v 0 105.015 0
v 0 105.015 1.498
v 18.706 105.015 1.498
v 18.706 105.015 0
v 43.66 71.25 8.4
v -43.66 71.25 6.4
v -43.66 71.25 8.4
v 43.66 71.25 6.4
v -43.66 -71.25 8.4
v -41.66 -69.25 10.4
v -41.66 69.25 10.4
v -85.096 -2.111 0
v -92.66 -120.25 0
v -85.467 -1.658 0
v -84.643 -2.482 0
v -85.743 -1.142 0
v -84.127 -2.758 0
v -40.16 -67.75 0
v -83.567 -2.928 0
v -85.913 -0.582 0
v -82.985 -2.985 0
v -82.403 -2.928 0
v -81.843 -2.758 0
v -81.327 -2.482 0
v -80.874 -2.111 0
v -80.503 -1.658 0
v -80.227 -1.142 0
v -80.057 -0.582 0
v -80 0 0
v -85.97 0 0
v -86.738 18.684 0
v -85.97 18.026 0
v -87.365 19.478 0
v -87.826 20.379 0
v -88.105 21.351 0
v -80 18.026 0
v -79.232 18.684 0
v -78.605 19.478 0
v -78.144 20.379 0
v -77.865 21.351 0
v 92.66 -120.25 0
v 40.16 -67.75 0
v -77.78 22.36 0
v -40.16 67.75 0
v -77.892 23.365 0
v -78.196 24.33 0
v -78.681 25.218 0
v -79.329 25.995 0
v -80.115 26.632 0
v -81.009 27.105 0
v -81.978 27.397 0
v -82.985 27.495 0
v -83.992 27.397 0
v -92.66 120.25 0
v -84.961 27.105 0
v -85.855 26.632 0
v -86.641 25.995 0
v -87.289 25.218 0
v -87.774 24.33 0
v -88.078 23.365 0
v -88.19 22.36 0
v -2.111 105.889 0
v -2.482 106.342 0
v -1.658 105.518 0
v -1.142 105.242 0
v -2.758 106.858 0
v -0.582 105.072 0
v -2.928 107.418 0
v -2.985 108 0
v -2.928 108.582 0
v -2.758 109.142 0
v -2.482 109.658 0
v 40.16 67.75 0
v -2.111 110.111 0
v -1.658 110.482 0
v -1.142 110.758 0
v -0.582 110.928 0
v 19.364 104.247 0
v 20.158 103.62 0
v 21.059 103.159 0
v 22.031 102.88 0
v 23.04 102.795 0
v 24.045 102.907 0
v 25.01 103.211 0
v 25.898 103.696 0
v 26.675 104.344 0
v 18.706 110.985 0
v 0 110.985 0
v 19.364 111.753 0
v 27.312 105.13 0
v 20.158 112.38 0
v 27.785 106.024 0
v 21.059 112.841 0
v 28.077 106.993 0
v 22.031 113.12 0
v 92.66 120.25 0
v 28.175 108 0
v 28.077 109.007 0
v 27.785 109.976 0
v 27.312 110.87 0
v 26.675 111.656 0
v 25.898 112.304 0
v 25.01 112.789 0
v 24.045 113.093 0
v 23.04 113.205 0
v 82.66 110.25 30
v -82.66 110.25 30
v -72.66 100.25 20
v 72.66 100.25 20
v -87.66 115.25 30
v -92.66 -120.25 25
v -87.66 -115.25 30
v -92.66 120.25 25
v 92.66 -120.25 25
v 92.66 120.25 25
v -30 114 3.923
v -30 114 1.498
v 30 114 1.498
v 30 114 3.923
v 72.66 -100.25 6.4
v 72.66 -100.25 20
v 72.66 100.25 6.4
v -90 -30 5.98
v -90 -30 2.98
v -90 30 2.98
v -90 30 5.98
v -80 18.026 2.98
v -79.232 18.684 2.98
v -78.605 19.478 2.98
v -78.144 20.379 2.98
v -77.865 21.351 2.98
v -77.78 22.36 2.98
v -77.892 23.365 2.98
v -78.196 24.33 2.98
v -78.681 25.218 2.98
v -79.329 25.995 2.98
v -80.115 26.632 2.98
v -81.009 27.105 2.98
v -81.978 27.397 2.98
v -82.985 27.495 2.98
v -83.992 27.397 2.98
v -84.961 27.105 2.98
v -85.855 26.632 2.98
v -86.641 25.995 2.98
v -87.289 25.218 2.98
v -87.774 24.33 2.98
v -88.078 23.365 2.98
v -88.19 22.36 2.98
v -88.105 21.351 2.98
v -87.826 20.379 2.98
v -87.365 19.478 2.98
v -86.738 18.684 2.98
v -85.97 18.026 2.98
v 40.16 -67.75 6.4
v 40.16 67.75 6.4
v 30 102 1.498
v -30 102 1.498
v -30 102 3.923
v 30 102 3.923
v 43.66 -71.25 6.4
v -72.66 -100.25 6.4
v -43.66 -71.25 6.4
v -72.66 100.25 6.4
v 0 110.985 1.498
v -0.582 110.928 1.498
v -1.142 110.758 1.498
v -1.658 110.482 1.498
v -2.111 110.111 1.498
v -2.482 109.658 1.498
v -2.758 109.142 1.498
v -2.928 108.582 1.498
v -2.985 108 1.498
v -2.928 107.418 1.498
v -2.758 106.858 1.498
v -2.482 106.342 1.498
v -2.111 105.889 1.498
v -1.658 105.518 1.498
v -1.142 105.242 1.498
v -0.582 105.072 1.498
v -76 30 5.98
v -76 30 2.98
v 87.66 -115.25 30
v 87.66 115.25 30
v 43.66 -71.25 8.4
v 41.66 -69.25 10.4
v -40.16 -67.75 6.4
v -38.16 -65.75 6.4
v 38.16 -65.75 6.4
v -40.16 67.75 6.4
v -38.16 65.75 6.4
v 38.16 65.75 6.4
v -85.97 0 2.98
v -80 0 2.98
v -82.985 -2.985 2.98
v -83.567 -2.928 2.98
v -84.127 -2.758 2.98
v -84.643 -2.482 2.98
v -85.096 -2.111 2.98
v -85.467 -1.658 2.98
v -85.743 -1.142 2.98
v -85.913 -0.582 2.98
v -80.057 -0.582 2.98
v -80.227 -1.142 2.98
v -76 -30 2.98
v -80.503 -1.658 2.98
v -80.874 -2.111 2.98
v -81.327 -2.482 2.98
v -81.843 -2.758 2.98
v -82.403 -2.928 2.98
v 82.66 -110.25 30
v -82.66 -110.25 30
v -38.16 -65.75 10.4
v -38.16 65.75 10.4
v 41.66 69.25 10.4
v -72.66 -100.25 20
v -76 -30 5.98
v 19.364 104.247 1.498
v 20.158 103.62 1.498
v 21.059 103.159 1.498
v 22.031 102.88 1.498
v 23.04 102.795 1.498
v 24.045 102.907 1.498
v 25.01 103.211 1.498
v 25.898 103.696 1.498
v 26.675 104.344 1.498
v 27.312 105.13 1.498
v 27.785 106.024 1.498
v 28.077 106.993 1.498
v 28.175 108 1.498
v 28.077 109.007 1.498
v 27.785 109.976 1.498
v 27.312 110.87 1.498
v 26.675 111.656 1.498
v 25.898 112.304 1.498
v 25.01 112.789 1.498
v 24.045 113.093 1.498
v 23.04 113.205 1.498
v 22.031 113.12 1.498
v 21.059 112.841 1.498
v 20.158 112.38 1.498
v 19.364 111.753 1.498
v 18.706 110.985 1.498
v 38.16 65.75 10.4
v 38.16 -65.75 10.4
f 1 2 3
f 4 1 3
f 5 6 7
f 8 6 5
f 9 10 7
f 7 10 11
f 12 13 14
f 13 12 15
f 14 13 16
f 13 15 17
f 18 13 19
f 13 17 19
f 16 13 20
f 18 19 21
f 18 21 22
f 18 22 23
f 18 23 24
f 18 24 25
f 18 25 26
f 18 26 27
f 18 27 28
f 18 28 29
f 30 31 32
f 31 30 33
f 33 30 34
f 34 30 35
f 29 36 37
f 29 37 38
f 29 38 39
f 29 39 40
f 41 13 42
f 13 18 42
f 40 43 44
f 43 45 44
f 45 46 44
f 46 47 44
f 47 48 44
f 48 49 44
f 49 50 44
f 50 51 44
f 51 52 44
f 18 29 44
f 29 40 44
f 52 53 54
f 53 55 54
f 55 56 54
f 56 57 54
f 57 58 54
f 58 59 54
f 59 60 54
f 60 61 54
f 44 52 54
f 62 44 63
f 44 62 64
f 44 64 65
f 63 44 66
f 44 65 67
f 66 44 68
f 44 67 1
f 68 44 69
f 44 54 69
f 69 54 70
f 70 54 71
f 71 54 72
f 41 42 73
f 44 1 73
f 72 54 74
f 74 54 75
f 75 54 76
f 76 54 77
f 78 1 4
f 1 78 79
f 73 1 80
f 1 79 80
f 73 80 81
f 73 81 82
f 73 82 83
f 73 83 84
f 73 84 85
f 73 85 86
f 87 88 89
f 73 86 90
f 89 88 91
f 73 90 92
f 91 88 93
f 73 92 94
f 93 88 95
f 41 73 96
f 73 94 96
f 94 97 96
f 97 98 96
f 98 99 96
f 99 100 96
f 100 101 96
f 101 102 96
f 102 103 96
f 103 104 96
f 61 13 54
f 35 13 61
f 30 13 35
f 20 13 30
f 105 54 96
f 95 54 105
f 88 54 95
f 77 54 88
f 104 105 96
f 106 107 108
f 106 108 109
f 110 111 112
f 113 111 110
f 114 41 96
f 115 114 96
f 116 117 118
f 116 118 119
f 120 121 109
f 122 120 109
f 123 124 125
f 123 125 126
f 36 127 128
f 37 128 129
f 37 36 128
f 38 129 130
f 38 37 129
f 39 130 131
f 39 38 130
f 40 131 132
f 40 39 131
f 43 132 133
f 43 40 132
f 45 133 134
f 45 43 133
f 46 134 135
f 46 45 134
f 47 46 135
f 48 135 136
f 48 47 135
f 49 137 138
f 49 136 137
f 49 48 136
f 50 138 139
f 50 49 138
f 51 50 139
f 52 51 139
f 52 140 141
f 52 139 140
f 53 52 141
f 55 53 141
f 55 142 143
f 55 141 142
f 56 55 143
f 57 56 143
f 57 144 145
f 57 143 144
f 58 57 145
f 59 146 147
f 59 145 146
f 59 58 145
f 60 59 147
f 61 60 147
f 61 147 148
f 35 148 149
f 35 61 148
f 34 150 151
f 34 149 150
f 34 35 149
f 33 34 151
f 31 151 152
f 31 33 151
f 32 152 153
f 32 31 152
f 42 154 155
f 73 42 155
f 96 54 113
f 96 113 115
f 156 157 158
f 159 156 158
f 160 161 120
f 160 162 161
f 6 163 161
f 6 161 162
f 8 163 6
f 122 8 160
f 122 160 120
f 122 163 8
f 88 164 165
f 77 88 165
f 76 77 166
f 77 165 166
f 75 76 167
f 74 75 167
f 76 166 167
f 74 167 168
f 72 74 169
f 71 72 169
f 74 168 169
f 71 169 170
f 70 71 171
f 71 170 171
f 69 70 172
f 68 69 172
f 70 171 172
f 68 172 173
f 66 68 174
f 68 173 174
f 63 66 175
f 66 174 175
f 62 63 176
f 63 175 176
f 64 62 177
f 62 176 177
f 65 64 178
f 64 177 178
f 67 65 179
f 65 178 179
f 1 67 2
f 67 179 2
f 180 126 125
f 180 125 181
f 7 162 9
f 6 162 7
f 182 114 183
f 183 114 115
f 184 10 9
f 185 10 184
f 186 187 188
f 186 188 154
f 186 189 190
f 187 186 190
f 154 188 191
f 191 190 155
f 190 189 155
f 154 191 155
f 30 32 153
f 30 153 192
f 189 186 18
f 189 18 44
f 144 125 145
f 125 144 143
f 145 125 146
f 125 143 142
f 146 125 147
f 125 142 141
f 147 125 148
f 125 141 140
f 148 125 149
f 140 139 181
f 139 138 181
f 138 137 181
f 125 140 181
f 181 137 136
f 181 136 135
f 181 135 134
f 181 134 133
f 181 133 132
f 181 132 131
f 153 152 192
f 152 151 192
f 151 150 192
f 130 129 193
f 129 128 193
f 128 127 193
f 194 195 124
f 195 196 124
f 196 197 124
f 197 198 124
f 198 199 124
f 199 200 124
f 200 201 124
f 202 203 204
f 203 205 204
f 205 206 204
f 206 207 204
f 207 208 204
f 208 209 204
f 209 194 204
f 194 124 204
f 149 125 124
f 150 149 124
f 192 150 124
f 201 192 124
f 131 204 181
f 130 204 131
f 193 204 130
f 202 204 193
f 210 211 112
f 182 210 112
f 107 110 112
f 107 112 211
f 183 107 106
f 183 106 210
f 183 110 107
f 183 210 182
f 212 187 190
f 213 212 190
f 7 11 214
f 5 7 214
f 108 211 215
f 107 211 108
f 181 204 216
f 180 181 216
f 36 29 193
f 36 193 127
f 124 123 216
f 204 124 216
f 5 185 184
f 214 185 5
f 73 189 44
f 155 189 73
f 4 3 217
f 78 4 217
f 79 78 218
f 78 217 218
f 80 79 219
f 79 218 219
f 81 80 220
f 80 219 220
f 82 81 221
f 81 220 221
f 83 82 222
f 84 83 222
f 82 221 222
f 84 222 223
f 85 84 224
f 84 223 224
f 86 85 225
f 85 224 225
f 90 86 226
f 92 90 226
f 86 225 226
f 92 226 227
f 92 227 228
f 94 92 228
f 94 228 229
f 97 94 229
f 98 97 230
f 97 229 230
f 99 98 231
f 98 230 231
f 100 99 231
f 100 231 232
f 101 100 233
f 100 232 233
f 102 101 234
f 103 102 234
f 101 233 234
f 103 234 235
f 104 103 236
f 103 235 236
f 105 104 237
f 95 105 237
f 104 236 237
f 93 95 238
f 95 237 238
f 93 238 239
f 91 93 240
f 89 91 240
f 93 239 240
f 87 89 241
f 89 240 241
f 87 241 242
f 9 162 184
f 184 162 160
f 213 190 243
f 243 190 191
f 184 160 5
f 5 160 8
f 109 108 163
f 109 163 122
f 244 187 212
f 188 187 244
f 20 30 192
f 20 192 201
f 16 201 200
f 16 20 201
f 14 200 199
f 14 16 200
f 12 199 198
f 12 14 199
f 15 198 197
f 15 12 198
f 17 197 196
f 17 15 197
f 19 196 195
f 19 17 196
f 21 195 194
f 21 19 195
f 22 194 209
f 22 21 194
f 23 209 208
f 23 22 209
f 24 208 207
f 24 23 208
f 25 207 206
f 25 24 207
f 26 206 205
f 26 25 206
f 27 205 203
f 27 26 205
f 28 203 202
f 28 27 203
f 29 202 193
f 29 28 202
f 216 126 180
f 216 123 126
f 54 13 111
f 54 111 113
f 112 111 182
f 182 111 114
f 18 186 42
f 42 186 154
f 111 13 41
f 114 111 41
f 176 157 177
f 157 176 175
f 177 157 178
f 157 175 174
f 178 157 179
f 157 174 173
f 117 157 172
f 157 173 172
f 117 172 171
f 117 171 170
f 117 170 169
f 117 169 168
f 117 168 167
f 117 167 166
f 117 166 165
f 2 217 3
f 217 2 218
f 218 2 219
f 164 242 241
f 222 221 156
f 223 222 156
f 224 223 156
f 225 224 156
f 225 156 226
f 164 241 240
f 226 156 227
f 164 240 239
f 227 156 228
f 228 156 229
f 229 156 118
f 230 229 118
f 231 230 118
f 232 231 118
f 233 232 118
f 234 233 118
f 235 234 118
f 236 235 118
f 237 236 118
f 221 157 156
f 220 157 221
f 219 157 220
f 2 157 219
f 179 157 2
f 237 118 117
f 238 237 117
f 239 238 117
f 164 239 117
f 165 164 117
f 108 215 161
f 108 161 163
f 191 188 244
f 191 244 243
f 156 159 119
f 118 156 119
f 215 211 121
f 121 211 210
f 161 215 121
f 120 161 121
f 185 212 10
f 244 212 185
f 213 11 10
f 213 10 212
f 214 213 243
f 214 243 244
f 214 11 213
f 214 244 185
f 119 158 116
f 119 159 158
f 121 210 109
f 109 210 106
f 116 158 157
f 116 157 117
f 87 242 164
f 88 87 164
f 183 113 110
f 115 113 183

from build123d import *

# Parameters (mm, degrees)
SKETCH_W             = 185.32
SKETCH_H             = 240.5
PAD_DEPTH            = 30
SKETCH003_W          = 145.32
SKETCH003_H          = 200.5
POCKET_DEPTH         = 23.6
SKETCH004_W          = 80.32
SKETCH004_H          = 135.5
POCKET001_DEPTH      = 6.4
POCKET002_DEPTH      = 3
SKETCH006_W          = 14
SKETCH006_H          = 3
POCKET003_DEPTH      = 30
POCKET004_DEPTH      = 1.5
SKETCH008_W          = 12
SKETCH008_H          = 2.4244
POCKET005_DEPTH      = 30
SKETCH009_W          = 87.32
SKETCH009_H          = 142.5
PAD001_DEPTH         = 4
SKETCH010_W          = 76.32
SKETCH010_H          = 131.5
POCKET006_DEPTH      = 0.001
POCKET006_DEPTH_BACK = -30.001
CHAMFER_SIZE         = 10
CHAMFER001_SIZE      = 5
CHAMFER002_SIZE      = 2


with BuildPart() as part:
    # Sketch → Pad (new body)
    with BuildSketch(Plane.XY):
        Rectangle(SKETCH_W, SKETCH_H)
    extrude(amount=PAD_DEPTH)

    # Sketch003 → Pocket (cut)
    with BuildSketch(Plane.XY.offset(30)):
        Rectangle(SKETCH003_W, SKETCH003_H)
    extrude(amount=-POCKET_DEPTH, mode=Mode.SUBTRACT)

    # Sketch004 → Pocket001 (cut)
    with BuildSketch(Plane.XY.offset(6.4)):
        Rectangle(SKETCH004_W, SKETCH004_H)
    extrude(amount=-POCKET001_DEPTH, mode=Mode.SUBTRACT)

    # Sketch005 → Pocket002 (cut)
    with BuildSketch(Plane.XY):
        with BuildLine():
            ThreePointArc((-85.97, 0), (-82.985, -2.985), (-80, 0))
            Line((-80, 0), (-80, 18.025988))
            ThreePointArc((-80, 18.025988), (-82.985, 27.495), (-85.97, 18.025988))
            Line((-85.97, 18.025988), (-85.97, 0))
        make_face()
    extrude(amount=POCKET002_DEPTH, mode=Mode.SUBTRACT)

    # Sketch006 → Pocket003 (cut, symmetric)
    with BuildSketch(Plane.XZ):
        with Locations((-83, 4.48)):
            Rectangle(SKETCH006_W, SKETCH006_H)
    extrude(amount=POCKET003_DEPTH, both=True, mode=Mode.SUBTRACT)

    # Sketch007 → Pocket004 (cut, symmetric)
    with BuildSketch(Plane.XY):
        with BuildLine():
            ThreePointArc((0, 110.985), (-2.985, 108), (0, 105.015))
            Line((0, 105.015), (18.705988, 105.015))
            ThreePointArc((18.705988, 105.015), (28.175, 108), (18.705988, 110.985))
            Line((18.705988, 110.985), (0, 110.985))
        make_face()
    extrude(amount=POCKET004_DEPTH, both=True, mode=Mode.SUBTRACT)

    # Sketch008 → Pocket005 (cut, symmetric)
    with BuildSketch(Plane.YZ):
        with Locations((108, 2.7105)):
            Rectangle(SKETCH008_W, SKETCH008_H)
    extrude(amount=POCKET005_DEPTH, both=True, mode=Mode.SUBTRACT)

    # Sketch009 → Pad001 (join)
    with BuildSketch(Plane.XY.offset(6.4)):
        Rectangle(SKETCH009_W, SKETCH009_H)
    extrude(amount=PAD001_DEPTH)

    # Sketch010 → Pocket006 (cut, two sides)
    with BuildSketch(Plane.XY) as pocket006_sk:
        Rectangle(SKETCH010_W, SKETCH010_H)
    extrude(amount=-POCKET006_DEPTH, mode=Mode.SUBTRACT)
    extrude(pocket006_sk.sketch, amount=-POCKET006_DEPTH_BACK, mode=Mode.SUBTRACT)

    # Chamfer
    chamfer_edges = [part.edges().sort_by_distance(p)[0] for p in [
        (-72.66, 0, 30),
        (0, 100.25, 30),
        (72.66, 0, 30),
        (0, -100.25, 30),
    ]]
    chamfer(chamfer_edges, length=CHAMFER_SIZE)

    # Chamfer001
    chamfer001_edges = [part.edges().sort_by_distance(p)[0] for p in [
        (0, 120.25, 30),
        (-92.66, 0, 30),
        (0, -120.25, 30),
        (92.66, 0, 30),
    ]]
    chamfer(chamfer001_edges, length=CHAMFER001_SIZE)

    # Chamfer002
    chamfer002_edges = [part.edges().sort_by_distance(p)[0] for p in [
        (-43.66, 0, 10.4),
        (0, -71.25, 10.4),
        (43.66, 0, 10.4),
        (0, 71.25, 10.4),
    ]]
    chamfer(chamfer002_edges, length=CHAMFER002_SIZE)


solid = part.part
